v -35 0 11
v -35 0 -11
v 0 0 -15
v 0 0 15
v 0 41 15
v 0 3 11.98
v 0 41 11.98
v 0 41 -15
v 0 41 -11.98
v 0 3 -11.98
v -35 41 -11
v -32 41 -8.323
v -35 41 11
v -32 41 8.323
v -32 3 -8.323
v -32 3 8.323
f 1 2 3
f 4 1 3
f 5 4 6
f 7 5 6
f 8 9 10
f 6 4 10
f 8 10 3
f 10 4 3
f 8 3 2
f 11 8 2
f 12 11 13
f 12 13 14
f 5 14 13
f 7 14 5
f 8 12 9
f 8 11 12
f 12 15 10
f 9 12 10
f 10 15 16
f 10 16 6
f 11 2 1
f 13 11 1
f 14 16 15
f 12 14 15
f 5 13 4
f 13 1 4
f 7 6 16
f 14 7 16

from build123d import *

# Parameters (mm, degrees)
BOSS_EXTRUDE1_DEPTH = 3
BOSS_EXTRUDE3_DEPTH = 38


with BuildPart() as part:
    # Sketch1 → Boss-Extrude1 (new body)
    with BuildSketch(Plane(origin=(0, 0, 0), x_dir=(1, 0, 0), z_dir=(0, 1, 0))):
        Polygon((-35, 0), (0, 0), (0, 15), (-35, 11), align=None)
        Polygon((-35, -11), (0, -15), (0, 0), (-35, 0), align=None)
    extrude(amount=BOSS_EXTRUDE1_DEPTH)

    # Sketch2 → Boss-Extrude3 (add)
    with BuildSketch(Plane(origin=(0, 3, 0), x_dir=(1, 0, 0), z_dir=(0, 1, 0))):
        Polygon((-35, 11), (-35, -11), (0, -15), (0, -11.980471722), (-32, -8.323328865), (-32, 8.323328865), (0, 11.980471722), (0, 15), align=None)
    extrude(amount=BOSS_EXTRUDE3_DEPTH)


solid = part.part
